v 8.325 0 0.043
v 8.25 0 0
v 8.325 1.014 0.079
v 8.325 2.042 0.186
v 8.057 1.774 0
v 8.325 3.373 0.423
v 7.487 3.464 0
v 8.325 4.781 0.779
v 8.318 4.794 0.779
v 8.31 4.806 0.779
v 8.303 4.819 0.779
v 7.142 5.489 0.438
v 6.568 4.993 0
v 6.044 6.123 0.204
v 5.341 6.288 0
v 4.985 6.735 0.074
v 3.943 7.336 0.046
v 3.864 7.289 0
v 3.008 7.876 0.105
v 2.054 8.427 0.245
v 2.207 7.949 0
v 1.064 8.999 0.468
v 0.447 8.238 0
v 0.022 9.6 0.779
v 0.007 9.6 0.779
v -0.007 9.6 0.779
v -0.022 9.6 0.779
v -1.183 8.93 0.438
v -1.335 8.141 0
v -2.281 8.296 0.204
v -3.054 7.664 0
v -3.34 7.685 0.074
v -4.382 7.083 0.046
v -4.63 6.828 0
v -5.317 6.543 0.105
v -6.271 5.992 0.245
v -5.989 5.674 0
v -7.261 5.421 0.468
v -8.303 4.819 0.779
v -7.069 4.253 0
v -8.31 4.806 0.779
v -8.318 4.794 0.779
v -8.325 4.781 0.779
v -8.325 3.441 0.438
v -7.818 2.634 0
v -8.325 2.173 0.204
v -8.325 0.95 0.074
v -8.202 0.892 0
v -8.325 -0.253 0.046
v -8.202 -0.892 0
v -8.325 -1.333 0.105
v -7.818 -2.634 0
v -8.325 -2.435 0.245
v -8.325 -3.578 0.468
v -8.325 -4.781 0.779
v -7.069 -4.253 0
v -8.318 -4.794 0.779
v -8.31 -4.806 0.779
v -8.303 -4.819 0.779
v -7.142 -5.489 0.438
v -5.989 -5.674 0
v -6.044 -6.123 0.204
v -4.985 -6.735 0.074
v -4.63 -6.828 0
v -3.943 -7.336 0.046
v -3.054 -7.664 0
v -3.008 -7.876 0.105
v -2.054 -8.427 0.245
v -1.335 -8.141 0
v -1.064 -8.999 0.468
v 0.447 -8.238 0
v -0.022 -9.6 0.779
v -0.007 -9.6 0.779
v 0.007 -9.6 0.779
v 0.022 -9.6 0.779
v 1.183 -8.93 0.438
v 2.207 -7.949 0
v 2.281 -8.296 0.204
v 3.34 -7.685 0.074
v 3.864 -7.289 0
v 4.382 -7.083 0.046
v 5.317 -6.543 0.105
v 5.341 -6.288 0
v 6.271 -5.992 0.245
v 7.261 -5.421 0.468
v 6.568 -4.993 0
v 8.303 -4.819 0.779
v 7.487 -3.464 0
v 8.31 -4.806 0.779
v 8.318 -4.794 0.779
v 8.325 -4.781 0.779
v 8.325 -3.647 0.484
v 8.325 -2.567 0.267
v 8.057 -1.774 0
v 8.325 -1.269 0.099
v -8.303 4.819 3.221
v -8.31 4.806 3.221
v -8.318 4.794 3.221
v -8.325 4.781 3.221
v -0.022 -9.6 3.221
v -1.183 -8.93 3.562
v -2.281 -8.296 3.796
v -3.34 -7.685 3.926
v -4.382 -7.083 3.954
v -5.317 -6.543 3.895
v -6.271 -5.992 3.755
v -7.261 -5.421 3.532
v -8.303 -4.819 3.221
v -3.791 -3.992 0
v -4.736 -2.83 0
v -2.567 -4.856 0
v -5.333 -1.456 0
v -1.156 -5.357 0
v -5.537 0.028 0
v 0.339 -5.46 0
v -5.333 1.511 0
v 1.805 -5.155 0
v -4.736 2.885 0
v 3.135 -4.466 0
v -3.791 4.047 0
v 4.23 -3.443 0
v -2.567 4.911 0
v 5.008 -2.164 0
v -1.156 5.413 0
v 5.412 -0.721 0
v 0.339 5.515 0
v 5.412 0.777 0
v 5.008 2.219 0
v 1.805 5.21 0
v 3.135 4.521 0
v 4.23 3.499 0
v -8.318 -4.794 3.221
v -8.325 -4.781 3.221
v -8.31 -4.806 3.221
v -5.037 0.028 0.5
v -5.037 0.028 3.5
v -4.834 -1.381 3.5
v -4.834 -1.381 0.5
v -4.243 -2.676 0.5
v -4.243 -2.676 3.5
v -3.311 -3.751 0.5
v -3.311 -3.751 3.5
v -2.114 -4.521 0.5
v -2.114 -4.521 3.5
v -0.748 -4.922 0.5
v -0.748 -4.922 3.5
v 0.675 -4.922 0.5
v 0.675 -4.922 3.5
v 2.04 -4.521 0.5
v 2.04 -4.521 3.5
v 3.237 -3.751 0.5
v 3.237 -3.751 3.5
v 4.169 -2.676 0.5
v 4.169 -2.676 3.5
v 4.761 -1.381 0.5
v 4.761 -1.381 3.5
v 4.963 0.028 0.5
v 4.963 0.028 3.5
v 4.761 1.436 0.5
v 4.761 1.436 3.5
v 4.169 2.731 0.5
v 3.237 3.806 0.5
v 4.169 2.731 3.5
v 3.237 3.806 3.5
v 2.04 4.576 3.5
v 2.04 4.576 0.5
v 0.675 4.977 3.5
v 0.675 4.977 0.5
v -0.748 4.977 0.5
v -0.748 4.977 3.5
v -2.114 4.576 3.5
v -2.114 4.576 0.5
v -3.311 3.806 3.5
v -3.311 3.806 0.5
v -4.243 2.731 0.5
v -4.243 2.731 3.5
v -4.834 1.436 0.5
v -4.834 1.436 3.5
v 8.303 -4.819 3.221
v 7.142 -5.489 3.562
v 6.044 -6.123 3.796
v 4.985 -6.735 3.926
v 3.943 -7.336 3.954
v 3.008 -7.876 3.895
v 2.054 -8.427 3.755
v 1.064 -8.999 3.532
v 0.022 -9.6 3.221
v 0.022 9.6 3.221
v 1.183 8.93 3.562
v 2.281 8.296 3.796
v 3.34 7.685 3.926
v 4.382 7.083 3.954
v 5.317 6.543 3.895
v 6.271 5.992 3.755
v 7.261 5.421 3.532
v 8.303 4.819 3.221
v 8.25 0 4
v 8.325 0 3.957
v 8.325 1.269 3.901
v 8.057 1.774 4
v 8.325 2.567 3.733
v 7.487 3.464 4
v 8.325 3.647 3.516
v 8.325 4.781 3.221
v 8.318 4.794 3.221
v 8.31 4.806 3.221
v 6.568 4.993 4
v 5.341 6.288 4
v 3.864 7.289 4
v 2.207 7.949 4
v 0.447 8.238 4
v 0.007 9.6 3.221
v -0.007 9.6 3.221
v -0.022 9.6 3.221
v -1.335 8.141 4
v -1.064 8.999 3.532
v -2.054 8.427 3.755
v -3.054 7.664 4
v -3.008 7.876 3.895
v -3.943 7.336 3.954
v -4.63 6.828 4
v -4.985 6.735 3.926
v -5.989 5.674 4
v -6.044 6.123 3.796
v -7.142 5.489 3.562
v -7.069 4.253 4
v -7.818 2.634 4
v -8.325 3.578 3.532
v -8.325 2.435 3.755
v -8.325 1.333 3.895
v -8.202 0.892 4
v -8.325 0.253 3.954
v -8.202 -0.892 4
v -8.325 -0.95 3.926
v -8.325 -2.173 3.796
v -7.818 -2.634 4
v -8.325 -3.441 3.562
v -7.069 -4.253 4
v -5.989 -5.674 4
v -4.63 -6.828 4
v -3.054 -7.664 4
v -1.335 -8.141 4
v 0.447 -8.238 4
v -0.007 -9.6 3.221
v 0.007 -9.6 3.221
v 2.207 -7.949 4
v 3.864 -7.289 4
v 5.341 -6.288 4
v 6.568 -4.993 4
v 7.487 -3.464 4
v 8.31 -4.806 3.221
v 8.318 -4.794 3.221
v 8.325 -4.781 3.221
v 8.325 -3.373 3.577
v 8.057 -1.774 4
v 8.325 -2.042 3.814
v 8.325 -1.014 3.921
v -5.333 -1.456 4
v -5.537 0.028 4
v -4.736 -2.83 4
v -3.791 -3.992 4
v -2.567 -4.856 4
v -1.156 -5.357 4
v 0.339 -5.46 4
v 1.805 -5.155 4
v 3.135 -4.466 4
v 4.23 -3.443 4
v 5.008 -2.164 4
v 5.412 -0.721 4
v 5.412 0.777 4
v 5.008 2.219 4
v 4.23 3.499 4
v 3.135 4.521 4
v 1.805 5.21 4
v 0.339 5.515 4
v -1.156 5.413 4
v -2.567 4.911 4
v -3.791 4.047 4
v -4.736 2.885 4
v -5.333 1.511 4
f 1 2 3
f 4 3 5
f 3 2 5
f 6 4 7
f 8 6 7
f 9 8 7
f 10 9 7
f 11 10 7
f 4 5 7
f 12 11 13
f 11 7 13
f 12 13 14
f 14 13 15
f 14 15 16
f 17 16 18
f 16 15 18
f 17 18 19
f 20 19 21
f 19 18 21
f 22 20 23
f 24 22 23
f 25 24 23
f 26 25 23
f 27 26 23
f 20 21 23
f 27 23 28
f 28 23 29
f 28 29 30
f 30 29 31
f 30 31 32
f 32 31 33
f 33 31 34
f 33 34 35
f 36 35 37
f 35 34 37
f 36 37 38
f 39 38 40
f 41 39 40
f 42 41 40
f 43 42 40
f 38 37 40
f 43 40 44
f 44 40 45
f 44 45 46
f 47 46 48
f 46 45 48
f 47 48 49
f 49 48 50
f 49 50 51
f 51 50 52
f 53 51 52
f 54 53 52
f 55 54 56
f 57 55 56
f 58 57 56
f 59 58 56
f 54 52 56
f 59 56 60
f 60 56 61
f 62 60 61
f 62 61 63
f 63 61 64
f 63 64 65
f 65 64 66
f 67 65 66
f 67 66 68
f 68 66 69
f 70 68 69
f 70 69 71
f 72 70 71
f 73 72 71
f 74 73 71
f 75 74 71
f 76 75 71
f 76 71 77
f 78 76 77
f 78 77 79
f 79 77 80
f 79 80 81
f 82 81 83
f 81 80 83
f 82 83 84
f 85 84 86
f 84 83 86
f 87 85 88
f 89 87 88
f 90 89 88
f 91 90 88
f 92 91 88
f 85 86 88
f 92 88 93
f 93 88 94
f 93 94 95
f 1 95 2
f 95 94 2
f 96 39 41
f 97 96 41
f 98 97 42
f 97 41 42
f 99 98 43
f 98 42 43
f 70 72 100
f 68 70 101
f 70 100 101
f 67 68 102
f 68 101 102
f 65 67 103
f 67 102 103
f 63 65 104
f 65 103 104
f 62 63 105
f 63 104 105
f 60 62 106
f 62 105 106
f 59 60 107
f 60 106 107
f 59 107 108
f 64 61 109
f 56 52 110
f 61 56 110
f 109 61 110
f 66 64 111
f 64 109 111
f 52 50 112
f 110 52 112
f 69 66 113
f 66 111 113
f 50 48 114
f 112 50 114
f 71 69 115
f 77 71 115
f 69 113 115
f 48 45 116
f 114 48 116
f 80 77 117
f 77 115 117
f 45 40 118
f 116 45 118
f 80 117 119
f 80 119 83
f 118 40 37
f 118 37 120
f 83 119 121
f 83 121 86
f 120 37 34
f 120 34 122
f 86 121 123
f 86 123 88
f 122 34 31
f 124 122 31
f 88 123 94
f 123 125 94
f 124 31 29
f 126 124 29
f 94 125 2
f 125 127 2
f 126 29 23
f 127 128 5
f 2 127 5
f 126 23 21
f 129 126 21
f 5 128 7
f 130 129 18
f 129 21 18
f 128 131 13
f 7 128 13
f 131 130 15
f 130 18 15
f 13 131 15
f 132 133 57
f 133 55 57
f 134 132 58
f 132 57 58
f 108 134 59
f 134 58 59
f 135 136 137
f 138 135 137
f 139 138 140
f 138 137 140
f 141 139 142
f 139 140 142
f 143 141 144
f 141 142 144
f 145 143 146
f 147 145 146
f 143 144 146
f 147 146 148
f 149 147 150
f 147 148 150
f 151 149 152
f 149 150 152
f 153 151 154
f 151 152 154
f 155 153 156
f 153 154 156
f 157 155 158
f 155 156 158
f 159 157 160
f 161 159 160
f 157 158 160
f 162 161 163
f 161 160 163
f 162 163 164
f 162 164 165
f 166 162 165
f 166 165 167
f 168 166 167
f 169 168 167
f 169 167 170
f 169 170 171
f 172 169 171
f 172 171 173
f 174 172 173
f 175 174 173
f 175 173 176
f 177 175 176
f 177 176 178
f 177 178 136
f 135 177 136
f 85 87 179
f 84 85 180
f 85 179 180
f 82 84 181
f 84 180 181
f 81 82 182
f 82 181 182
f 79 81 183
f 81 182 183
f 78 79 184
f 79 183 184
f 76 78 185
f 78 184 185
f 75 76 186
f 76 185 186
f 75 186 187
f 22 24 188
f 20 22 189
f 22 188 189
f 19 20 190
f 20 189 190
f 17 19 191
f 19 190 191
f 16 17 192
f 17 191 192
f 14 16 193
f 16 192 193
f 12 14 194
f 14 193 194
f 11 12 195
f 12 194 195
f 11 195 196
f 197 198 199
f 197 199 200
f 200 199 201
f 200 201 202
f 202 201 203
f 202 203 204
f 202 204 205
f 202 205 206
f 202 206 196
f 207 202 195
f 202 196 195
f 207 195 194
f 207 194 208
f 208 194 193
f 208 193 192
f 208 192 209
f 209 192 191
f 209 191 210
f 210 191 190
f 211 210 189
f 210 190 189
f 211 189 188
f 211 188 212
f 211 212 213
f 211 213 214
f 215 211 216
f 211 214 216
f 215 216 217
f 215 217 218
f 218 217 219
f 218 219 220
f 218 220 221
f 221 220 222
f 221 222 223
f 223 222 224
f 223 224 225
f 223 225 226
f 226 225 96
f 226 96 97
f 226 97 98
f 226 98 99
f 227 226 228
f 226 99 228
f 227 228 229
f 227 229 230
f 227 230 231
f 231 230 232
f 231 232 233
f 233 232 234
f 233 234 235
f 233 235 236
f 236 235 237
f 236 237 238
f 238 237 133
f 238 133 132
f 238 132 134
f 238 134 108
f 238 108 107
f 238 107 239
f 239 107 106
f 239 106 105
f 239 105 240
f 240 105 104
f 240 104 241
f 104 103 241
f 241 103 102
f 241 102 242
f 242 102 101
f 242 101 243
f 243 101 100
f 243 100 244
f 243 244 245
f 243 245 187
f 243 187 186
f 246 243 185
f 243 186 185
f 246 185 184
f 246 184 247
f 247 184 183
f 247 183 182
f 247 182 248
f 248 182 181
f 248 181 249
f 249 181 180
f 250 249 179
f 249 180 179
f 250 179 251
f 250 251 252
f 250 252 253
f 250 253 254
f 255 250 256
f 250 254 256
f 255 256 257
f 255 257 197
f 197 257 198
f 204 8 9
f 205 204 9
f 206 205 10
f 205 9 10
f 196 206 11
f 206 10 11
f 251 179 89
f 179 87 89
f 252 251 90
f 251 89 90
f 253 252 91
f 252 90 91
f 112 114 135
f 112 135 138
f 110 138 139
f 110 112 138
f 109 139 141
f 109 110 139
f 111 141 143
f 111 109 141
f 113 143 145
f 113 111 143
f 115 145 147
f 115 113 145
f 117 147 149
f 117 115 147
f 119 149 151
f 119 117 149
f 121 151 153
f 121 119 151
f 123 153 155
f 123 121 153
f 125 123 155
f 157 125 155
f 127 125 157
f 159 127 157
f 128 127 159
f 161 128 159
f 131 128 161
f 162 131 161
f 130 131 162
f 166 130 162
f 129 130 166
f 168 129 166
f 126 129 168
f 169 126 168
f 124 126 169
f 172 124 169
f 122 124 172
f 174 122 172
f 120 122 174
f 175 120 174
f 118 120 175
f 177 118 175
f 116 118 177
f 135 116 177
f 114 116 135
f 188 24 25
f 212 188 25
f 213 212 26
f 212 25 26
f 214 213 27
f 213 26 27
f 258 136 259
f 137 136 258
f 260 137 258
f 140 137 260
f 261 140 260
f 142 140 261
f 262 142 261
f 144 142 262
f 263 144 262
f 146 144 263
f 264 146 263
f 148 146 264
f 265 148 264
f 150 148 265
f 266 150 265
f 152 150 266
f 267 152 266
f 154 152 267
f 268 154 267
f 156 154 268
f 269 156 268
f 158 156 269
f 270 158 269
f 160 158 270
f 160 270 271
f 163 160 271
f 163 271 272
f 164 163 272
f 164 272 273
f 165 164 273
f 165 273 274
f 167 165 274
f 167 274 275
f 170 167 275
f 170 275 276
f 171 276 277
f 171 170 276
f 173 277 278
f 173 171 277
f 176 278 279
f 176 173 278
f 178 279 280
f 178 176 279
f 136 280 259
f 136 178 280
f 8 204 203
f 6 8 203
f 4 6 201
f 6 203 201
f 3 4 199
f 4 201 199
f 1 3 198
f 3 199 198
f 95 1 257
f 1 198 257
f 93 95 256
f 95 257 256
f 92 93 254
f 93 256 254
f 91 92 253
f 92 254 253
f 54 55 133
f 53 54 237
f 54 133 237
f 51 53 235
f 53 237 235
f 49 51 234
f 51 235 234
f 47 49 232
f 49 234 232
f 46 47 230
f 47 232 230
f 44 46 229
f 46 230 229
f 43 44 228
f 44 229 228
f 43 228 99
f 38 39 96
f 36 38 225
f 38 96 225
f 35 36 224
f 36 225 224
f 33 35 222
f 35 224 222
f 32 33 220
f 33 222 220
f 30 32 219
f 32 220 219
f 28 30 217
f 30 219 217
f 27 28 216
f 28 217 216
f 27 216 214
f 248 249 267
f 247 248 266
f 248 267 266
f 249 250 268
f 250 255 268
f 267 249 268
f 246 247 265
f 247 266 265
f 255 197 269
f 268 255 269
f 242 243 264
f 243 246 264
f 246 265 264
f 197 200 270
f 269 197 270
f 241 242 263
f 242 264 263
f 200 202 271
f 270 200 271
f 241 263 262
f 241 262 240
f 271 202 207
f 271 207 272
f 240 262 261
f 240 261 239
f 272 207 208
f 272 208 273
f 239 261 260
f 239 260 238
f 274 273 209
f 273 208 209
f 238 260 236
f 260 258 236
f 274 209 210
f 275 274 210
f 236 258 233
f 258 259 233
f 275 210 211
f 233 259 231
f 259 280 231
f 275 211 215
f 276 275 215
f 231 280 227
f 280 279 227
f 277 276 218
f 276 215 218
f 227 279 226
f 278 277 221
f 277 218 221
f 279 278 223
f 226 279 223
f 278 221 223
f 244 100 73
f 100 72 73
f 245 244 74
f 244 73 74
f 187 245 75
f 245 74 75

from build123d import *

# Parameters (mm, degrees)
SKETCH001_R     = 10.612882
POCKET_DEPTH    = 4.001
SKETCH002_R     = 5
POCKET001_DEPTH = 4.001
CHAMFER_SIZE    = 0.5


with BuildPart() as part:
    # Sketch → Revolution (revolve)
    with BuildSketch(Plane.XZ):
        Polygon((0, 4), (8.25, 4), (9.6, 3.220577), (9.6, 0.779423), (8.25, 0), (0, 0), align=None)
    revolve(axis=Axis((0, 0, 0), (0, 0, 1)))

    # Sketch001 → Pocket (cut, through all)
    with BuildSketch(Plane(origin=(0, 0, 4), x_dir=(-1, 0, 0), z_dir=(0, 0, 1))):
        Circle(SKETCH001_R)
        Polygon((-8.325, 4.806441), (0, 9.612882), (8.325, 4.806441), (8.325, -4.806441), (0, -9.612882), (-8.325, -4.806441), align=None, mode=Mode.SUBTRACT)
    extrude(amount=-POCKET_DEPTH, mode=Mode.SUBTRACT)

    # Sketch002 → Pocket001 (cut, through all)
    with BuildSketch(Plane(origin=(0, 0, 4), x_dir=(-1, 0, 0), z_dir=(0, 0, 1))):
        with Locations((0.036806, -0.027604)):
            Circle(SKETCH002_R)
    extrude(amount=-POCKET001_DEPTH, mode=Mode.SUBTRACT)

    # Chamfer
    chamfer_edges = [part.edges().sort_by_distance(p)[0] for p in [
        (4.963194, 0.027604, 4),
        (4.963194, 0.027604, 0),
    ]]
    chamfer(chamfer_edges, length=CHAMFER_SIZE)


solid = part.part
